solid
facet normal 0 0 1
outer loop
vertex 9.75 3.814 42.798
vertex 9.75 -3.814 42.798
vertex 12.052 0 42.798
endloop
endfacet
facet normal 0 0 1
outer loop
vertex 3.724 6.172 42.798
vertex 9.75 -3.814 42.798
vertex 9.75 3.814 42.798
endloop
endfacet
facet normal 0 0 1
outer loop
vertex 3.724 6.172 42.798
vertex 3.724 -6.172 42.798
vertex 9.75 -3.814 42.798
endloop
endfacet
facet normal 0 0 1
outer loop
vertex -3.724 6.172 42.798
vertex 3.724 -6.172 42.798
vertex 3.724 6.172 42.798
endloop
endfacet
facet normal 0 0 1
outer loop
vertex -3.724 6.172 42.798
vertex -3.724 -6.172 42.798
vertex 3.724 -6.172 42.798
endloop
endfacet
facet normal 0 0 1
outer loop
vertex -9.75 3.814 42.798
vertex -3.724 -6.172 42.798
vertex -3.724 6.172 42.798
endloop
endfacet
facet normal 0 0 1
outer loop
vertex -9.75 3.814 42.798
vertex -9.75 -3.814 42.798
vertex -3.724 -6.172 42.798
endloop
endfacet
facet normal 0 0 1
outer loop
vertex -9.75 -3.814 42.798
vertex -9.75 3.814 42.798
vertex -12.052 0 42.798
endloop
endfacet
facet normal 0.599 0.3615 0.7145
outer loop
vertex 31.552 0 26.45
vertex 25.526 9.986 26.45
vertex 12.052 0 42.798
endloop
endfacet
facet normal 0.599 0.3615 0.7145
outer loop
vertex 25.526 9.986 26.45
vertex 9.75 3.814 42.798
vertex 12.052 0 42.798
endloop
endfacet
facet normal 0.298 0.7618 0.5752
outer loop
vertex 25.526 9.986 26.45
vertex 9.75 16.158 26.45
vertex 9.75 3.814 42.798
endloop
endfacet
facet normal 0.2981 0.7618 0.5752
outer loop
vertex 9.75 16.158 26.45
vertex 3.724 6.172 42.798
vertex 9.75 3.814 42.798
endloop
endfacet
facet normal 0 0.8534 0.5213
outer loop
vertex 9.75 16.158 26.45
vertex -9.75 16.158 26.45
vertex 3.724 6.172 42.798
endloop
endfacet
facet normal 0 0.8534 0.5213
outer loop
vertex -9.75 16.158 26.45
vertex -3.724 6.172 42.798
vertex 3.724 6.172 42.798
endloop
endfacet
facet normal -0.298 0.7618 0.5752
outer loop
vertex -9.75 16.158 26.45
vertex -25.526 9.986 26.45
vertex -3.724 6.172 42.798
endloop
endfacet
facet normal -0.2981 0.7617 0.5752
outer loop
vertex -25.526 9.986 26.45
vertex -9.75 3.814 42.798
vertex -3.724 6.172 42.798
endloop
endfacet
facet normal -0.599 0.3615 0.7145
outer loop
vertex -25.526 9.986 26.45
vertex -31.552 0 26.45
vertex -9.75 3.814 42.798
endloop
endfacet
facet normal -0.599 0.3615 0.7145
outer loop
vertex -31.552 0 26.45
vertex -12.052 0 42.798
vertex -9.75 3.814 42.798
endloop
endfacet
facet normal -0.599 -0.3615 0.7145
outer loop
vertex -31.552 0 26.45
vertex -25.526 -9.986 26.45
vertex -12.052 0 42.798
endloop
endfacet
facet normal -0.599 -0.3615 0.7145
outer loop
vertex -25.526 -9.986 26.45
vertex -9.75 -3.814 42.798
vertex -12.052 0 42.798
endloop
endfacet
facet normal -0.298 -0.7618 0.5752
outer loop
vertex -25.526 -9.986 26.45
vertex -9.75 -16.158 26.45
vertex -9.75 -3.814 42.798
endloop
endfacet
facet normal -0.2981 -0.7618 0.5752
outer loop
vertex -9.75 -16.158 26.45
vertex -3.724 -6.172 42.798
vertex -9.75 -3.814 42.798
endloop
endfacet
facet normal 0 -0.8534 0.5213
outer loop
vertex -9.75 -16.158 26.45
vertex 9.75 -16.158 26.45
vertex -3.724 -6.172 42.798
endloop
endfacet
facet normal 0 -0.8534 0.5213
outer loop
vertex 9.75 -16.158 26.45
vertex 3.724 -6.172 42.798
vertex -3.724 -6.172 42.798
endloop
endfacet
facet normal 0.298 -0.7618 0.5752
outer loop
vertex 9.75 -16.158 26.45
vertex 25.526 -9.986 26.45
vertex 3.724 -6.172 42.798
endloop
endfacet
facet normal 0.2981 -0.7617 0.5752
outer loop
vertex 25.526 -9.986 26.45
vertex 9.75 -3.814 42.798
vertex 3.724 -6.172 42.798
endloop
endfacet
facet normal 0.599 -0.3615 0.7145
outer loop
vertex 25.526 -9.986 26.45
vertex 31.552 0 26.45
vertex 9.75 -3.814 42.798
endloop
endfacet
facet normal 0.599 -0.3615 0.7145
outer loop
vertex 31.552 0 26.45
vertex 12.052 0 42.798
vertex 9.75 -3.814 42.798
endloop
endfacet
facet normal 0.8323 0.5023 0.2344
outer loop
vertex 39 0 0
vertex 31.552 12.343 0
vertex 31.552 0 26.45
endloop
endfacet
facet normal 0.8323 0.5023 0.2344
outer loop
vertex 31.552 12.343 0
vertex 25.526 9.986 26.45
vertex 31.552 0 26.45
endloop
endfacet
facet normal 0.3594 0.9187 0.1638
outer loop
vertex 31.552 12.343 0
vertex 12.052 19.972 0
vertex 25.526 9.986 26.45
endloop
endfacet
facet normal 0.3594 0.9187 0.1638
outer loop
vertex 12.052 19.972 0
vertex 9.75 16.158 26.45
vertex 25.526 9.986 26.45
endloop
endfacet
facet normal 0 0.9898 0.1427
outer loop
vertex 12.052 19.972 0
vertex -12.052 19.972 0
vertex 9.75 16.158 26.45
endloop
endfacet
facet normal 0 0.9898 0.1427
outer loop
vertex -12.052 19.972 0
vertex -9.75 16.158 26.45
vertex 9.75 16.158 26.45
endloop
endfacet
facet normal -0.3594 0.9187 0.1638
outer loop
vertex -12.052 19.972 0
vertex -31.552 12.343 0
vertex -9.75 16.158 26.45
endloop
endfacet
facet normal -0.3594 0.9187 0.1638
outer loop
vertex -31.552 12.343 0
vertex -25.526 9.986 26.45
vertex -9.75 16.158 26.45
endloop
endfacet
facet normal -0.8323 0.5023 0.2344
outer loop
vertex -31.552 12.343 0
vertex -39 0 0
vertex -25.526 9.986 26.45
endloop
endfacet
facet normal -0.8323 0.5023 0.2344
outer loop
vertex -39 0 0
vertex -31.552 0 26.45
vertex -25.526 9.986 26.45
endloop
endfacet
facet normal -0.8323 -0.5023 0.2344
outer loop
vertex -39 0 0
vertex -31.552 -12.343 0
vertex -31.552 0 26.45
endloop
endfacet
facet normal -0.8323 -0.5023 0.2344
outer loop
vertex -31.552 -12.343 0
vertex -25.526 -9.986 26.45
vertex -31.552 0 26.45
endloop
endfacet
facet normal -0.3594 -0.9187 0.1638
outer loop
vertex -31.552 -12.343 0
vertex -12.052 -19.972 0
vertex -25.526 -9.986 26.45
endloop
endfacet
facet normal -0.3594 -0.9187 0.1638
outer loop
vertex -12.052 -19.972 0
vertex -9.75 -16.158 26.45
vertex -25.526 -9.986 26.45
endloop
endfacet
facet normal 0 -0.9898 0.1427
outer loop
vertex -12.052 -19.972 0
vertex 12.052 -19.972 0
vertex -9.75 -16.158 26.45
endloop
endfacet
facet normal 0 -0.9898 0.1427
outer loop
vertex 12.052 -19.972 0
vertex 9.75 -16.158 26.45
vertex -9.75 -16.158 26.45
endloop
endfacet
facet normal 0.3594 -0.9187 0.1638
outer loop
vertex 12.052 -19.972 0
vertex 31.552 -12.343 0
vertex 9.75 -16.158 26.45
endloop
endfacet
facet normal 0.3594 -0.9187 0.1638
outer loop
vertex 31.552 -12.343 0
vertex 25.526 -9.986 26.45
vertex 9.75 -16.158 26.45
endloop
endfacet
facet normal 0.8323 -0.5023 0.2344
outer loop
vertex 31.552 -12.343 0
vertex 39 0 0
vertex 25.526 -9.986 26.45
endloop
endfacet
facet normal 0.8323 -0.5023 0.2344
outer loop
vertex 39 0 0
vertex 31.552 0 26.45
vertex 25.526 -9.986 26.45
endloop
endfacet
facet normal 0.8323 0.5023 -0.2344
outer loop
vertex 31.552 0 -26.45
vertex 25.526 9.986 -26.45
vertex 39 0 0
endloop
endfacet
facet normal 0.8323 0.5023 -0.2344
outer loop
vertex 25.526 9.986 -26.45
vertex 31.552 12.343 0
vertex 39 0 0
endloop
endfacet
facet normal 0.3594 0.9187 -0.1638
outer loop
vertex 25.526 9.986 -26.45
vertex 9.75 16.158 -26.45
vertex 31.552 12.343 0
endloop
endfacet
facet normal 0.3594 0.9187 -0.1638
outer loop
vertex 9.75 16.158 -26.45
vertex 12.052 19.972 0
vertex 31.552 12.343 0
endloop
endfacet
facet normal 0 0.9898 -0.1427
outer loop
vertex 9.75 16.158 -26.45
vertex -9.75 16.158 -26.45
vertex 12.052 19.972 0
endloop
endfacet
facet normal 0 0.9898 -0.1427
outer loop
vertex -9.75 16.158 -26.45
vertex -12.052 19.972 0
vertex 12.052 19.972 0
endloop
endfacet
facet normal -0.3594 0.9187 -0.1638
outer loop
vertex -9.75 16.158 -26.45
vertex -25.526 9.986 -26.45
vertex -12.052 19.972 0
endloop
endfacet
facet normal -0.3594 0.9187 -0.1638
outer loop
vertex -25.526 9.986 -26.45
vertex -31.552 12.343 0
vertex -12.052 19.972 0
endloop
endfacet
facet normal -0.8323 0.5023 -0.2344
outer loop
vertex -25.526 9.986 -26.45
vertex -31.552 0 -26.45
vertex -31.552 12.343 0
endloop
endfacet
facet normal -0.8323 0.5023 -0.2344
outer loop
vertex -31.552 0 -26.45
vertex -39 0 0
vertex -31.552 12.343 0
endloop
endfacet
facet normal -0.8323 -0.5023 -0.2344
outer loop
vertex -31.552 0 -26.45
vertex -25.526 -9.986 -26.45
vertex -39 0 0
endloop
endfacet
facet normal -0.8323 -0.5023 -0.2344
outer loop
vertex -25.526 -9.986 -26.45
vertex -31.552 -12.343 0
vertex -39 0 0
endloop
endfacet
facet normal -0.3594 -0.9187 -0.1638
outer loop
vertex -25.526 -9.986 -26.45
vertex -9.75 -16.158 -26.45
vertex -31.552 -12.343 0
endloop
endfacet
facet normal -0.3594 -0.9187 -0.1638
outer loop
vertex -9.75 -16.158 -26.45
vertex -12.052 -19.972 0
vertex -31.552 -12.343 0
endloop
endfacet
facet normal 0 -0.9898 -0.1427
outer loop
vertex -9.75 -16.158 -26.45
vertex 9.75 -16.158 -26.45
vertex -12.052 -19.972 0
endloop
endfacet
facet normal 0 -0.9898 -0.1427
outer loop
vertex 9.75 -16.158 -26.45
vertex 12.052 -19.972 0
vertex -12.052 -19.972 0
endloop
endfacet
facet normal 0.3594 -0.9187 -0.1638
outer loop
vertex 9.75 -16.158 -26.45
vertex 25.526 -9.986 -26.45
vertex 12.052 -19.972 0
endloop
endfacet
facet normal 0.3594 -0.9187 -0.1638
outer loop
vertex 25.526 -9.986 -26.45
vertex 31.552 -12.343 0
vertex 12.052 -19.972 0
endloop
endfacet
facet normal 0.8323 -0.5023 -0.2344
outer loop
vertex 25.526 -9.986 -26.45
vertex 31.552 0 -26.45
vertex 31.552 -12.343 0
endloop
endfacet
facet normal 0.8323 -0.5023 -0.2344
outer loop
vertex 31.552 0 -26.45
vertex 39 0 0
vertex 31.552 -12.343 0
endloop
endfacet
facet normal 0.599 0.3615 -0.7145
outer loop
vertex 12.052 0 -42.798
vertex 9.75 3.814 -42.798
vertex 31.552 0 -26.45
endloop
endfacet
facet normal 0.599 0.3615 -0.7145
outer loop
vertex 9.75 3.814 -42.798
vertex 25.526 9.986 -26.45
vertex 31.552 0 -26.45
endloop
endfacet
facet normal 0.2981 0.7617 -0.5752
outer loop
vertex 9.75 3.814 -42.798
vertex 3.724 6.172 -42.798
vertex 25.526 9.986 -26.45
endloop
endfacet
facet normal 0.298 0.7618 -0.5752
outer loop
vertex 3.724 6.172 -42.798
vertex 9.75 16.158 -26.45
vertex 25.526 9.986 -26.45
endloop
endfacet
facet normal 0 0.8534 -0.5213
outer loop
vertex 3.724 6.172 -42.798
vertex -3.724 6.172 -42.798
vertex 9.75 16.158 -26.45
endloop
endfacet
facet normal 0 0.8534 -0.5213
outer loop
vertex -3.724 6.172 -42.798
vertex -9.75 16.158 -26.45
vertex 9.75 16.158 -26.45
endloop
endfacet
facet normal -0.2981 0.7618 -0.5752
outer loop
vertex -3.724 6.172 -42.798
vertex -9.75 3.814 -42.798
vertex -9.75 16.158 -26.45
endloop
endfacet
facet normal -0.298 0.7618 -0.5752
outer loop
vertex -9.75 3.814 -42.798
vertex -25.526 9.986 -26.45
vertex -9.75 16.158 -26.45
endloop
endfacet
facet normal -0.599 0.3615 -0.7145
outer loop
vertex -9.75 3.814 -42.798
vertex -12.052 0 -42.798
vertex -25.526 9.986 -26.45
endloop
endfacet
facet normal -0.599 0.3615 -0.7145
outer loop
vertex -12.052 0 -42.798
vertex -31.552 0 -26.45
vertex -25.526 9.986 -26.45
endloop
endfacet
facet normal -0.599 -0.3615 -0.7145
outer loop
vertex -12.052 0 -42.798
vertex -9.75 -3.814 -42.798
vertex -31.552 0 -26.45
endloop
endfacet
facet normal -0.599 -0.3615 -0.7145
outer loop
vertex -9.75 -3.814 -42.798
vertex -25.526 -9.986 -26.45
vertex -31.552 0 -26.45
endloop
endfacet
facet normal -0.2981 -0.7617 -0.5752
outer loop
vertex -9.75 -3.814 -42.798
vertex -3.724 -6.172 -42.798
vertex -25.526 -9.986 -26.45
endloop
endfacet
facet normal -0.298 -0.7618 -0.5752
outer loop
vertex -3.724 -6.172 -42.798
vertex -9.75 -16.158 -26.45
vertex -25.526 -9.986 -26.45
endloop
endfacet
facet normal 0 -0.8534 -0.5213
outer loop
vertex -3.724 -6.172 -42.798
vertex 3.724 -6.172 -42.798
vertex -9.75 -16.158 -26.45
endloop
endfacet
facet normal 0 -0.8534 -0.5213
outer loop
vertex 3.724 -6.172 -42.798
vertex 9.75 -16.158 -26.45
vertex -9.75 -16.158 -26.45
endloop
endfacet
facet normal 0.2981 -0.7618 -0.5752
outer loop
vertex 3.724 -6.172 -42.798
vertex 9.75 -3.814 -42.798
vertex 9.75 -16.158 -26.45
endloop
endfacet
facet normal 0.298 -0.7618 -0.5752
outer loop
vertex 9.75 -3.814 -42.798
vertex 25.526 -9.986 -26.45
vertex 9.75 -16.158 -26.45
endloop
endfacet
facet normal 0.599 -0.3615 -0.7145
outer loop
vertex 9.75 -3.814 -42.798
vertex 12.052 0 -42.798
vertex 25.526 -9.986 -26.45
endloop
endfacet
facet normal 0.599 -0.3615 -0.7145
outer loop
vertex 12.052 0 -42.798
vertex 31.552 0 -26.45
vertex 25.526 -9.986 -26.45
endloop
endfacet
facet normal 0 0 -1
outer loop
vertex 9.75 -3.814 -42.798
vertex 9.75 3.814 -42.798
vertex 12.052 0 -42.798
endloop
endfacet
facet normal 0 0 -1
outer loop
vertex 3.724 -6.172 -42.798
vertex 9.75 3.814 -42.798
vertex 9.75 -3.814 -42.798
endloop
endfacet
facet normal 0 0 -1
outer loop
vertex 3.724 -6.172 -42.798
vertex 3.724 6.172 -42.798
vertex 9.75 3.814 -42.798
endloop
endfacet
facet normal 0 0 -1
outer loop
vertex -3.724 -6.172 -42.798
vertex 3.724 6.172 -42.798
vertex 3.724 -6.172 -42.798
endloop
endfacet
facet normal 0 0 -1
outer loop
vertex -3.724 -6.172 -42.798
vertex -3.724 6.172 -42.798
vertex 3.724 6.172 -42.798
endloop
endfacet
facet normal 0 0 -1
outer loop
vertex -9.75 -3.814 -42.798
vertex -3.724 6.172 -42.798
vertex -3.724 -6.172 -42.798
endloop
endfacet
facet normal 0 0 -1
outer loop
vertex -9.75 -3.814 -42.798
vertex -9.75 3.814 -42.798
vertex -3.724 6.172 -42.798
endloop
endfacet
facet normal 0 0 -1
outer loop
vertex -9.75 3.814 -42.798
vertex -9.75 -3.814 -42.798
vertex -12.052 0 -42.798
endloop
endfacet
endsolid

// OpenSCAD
// Generated by SolidPython 1.0.1 on 2020-07-29 00:46:50


scale(v = [13, 7, 15]) {
	sphere(r = 3);
}
/***********************************************
*********      SolidPython code:      **********
************************************************
 
# import packages: SolidPython
from solid import *
from solid.utils import *
from itertools import chain, combinations, permutations


class Resize:

    def __init__(self, scad_file):
        self.scad_file = scad_file
        #self.scad_file = import_scad(scad_file)
        # cone/cylinder param:
        self.r1 = 0
        self.r2 = 0
        self.h = 0
        # rectangular prism param:
        self.w = 0
        self.l = 0
        # ellipse param:
        self.r = 0

    # import OpenScad code (file name corresponds to shape)


    # classify shape + parameters
    def assign(self, param1, param2, param3):
        if self.scad_file == 'cone.scad':
            self.r1 = param1
            self.r2 = param2
            self.h = param3
        elif self.scad_file == 'cylinder.scad':
            self.r1 = param1
            self.r2 = param2
            self.h = param3
        elif self.scad_file == 'rectangularPrism.scad':
            self.h = param1
            self.l = param2
            self.w = param3
        else:
            self.r = param1
            self.h = param2

    # resize parameters
    def iterate(self):
        x = range(3, 20, 2)
        i = 1
        if self.scad_file == 'cone.scad':
            tempList = list(permutations(x, 2))
            for temp in tempList:
                param1 = temp[0]
                param2 = temp[1]
                filepath = 'produced_scad_files/' + 'cone' + str(param1) + '_' + str(param2) + '_' + '.scad'
                scad_render_to_file(cylinder(h=param1, r1=param2, r2=0), filepath)

        elif self.scad_file == 'cylinder.scad':
            tempList = list(permutations(x, 3))
            for temp in tempList:
                param1 = temp[0]
                param2 = temp[1]
                filepath = 'produced_scad_files/' + 'cylinder' + str(param1) + '_' + str(param2) + '_' + '.scad'
                scad_render_to_file(cylinder(h=param1, r1=param2, r2=param2), filepath)

        elif self.scad_file == 'rectangularPrism.scad':
            tempList = list(permutations(x, 3))
            for temp in tempList:
                param1 = temp[0]
                param2 = temp[1]
                param3 = temp[2]
                filepath = 'produced_scad_files/' + 'rectangularPrism' + str(param1) + '_' + str(param2) + '_' + str(
                    param3) + '.scad'
                scad_render_to_file(cube(size=(param1, param2, param3)), filepath)

        elif self.scad_file == 'ellipse.scad':
            tempList = list(permutations(x, 4))
            for temp in tempList:
                param1 = temp[0]
                param2 = temp[1]
                param3 = temp[2]
                param4 = temp[3]
                filepath = 'produced_scad_files/' + 'ellipse' + str(param1) + '_' + str(param2) + '_' + str(param3) + '_' + str(param4) + '.scad'
                scad_render_to_file(scale([param1, param2, param3])(sphere(r=param4)), filepath)

    def render_to_scadfile(self):
        scad_render_to_file(scad, 'example.scad') 
 
************************************************/
